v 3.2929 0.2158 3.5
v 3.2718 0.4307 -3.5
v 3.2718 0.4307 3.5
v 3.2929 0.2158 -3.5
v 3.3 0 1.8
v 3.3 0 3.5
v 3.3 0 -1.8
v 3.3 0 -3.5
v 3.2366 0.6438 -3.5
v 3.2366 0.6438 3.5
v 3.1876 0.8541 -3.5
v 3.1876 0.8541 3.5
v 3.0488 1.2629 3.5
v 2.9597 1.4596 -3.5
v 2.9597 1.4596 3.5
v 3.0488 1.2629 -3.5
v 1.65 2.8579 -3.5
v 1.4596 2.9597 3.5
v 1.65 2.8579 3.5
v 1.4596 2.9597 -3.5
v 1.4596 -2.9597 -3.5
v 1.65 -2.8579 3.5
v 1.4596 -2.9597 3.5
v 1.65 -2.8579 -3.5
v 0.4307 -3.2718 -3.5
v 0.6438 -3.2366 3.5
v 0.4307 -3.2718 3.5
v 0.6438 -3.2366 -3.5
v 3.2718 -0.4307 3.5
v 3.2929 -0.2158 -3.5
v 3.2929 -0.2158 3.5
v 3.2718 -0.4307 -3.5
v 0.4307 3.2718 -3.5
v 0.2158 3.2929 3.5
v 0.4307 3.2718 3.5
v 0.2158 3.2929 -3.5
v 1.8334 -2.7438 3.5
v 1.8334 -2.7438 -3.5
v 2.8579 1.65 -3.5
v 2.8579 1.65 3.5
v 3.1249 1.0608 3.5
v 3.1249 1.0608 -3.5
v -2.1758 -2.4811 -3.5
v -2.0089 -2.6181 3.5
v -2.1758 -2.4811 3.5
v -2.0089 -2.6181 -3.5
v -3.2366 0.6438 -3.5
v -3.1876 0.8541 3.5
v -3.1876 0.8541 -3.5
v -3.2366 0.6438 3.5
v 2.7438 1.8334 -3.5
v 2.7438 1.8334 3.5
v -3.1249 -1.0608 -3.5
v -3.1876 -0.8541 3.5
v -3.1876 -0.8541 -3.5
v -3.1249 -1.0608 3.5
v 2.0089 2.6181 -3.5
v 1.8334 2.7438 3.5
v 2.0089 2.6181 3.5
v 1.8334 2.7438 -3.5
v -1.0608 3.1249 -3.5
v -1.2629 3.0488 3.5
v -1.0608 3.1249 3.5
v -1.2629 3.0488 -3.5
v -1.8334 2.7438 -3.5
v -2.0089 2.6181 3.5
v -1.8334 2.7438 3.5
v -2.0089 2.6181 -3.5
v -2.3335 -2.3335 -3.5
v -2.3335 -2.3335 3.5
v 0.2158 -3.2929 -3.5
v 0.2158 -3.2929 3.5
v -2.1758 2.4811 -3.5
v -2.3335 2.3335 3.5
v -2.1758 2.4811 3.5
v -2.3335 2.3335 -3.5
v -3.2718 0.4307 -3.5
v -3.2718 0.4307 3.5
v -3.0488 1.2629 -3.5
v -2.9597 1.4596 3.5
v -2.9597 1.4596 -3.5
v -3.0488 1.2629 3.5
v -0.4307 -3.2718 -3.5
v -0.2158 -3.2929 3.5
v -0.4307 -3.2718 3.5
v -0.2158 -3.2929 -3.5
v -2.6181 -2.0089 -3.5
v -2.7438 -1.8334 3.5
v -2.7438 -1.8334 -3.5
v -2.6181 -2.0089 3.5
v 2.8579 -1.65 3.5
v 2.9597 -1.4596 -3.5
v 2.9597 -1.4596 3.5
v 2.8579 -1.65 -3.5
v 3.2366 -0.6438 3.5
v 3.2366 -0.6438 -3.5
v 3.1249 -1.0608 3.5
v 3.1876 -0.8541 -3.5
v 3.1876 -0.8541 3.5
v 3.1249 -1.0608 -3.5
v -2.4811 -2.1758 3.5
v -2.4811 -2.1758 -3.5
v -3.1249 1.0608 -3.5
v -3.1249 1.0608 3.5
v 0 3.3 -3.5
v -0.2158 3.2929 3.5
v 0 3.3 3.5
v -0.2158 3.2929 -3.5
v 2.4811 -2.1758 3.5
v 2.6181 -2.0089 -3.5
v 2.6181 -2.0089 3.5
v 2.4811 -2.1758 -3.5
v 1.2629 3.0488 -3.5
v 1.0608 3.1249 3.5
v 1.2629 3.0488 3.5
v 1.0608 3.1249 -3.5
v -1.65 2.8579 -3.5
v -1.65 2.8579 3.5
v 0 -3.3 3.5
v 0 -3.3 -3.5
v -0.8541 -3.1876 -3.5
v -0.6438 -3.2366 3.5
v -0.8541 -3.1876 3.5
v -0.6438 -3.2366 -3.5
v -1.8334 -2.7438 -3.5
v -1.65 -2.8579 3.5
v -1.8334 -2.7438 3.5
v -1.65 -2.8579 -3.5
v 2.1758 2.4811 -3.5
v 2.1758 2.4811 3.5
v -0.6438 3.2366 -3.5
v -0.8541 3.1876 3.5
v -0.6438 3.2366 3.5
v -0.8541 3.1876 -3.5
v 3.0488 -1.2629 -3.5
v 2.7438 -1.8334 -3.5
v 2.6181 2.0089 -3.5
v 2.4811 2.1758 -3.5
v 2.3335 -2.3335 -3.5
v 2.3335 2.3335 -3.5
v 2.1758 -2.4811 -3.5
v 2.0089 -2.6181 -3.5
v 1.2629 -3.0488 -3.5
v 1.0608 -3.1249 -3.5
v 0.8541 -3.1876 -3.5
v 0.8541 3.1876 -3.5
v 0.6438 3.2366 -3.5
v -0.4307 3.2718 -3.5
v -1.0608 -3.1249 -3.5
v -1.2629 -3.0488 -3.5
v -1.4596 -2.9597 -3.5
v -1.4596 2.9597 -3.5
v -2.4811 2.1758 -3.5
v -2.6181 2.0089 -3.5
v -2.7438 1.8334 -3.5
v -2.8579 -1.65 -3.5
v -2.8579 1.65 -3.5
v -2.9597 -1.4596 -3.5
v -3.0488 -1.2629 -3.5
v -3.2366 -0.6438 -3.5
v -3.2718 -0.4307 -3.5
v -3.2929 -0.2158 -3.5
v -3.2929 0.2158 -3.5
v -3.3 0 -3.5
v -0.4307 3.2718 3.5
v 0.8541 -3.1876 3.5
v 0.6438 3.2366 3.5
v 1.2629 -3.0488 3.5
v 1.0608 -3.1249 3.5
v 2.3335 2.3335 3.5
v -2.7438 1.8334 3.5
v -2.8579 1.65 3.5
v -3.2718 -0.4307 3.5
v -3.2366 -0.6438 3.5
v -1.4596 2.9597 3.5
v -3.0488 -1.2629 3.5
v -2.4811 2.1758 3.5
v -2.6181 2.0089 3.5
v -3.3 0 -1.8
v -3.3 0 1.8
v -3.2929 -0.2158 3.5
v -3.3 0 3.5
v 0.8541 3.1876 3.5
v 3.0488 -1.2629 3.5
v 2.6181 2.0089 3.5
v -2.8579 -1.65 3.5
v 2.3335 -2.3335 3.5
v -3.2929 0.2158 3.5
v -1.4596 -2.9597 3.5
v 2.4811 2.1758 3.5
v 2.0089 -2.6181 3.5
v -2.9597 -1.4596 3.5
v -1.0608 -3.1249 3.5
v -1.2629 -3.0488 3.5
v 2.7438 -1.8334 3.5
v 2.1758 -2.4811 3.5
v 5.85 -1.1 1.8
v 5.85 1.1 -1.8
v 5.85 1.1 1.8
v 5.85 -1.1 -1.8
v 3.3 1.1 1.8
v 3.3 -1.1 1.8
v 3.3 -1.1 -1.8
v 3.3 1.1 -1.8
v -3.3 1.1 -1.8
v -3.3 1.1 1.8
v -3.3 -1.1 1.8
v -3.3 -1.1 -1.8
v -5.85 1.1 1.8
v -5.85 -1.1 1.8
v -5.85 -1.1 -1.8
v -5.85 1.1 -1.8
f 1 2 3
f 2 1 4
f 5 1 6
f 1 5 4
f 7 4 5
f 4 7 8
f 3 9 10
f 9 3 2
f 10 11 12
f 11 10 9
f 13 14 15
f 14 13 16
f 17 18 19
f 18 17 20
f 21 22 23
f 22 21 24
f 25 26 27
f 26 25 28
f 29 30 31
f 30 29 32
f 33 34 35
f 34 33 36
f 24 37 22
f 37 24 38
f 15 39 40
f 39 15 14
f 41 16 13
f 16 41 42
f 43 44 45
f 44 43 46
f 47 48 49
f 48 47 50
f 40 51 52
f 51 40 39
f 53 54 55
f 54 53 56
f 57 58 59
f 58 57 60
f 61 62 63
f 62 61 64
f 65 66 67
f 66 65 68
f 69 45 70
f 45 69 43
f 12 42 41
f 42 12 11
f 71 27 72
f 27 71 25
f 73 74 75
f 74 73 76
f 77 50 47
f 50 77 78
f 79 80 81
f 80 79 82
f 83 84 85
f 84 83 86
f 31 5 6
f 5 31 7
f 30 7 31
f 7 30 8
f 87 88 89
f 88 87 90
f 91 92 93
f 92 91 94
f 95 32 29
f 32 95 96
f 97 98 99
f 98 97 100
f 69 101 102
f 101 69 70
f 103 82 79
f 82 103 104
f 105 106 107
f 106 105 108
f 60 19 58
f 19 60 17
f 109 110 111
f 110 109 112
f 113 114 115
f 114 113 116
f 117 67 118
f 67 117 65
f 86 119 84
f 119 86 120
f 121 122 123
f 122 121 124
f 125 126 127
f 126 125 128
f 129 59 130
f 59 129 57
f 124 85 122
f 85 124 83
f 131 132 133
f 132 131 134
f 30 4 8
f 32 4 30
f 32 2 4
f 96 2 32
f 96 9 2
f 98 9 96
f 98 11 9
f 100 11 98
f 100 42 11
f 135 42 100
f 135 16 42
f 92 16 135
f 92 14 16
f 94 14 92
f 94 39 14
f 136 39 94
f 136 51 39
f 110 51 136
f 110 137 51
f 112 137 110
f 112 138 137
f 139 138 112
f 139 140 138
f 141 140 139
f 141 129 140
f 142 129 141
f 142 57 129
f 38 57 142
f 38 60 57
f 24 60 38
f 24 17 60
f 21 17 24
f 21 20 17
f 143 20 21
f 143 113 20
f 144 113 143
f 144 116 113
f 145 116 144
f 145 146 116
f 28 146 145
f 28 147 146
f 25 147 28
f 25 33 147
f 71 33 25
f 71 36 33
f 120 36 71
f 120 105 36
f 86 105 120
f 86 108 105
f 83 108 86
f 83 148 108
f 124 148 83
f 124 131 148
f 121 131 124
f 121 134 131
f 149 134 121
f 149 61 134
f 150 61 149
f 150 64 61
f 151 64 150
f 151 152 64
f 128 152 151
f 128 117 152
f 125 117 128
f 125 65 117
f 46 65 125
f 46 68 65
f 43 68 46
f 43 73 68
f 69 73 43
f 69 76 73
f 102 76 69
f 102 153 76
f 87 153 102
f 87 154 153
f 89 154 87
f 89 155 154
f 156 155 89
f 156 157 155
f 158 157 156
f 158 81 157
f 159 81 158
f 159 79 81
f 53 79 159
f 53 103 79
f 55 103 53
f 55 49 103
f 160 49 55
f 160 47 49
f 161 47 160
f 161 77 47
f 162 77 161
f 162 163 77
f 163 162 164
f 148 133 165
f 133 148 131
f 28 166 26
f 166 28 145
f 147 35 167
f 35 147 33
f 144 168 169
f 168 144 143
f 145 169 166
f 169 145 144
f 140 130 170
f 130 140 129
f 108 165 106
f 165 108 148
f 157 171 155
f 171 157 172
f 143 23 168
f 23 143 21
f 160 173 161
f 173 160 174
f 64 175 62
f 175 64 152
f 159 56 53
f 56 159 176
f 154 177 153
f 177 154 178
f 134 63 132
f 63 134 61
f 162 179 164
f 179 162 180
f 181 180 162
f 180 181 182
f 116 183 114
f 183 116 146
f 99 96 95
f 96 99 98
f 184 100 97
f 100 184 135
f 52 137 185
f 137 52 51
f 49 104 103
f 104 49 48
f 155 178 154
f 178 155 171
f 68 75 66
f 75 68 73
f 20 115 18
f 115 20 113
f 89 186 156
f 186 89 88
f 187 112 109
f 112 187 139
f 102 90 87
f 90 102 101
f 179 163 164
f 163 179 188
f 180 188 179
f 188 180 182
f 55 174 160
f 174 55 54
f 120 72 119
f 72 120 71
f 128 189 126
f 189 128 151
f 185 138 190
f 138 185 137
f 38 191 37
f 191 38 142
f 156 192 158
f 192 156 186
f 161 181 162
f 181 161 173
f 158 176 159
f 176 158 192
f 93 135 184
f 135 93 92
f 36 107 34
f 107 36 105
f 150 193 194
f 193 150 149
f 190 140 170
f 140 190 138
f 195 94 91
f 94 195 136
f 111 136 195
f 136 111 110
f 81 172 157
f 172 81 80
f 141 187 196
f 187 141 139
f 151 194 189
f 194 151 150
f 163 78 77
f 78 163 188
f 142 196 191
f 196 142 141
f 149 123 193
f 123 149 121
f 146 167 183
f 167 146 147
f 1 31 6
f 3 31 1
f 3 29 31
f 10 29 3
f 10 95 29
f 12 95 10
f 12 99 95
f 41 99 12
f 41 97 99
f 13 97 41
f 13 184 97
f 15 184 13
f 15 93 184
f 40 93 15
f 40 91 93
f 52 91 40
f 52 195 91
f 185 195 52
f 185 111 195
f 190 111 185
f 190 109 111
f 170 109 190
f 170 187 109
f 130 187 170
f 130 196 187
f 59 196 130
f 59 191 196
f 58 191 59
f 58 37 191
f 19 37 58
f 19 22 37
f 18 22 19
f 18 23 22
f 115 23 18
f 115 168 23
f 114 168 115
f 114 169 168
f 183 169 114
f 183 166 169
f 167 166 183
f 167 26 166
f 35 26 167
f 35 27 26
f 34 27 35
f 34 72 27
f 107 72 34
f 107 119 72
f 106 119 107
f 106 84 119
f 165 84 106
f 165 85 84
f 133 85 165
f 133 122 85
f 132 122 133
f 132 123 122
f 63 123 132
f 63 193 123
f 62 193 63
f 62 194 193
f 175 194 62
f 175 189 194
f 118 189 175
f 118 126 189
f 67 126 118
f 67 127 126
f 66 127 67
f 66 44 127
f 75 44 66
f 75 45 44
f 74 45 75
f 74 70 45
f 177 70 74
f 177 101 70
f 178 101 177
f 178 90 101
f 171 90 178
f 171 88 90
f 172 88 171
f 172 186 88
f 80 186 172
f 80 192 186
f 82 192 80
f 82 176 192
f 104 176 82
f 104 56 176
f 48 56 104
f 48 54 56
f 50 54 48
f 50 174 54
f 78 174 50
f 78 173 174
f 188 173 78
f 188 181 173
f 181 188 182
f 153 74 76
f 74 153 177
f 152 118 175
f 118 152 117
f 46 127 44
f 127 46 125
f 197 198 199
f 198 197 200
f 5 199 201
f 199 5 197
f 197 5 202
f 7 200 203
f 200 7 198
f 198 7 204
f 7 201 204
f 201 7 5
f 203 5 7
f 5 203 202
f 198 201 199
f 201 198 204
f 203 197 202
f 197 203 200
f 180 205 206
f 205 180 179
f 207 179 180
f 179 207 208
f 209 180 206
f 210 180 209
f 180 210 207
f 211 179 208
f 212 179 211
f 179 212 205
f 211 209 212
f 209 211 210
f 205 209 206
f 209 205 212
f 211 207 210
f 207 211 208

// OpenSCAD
$fn=96;

bbox_x = 11.7;
bbox_y = 6.6;
bbox_z = 7.0;

cyl_d = 6.6;
cyl_h = 7.0;

lug_total_x = bbox_x - cyl_d;
lug_len = lug_total_x/2;
lug_thick_y = 2.2;
lug_h = 3.6;

module drum() {
    cylinder(d=cyl_d, h=cyl_h, center=true);
}

module lug(sign=1) {
    translate([sign*(cyl_d/2 + lug_len/2), 0, 0])
        cube([lug_len, lug_thick_y, lug_h], center=true);
}

union() {
    drum();
    lug(1);
    lug(-1);
}
